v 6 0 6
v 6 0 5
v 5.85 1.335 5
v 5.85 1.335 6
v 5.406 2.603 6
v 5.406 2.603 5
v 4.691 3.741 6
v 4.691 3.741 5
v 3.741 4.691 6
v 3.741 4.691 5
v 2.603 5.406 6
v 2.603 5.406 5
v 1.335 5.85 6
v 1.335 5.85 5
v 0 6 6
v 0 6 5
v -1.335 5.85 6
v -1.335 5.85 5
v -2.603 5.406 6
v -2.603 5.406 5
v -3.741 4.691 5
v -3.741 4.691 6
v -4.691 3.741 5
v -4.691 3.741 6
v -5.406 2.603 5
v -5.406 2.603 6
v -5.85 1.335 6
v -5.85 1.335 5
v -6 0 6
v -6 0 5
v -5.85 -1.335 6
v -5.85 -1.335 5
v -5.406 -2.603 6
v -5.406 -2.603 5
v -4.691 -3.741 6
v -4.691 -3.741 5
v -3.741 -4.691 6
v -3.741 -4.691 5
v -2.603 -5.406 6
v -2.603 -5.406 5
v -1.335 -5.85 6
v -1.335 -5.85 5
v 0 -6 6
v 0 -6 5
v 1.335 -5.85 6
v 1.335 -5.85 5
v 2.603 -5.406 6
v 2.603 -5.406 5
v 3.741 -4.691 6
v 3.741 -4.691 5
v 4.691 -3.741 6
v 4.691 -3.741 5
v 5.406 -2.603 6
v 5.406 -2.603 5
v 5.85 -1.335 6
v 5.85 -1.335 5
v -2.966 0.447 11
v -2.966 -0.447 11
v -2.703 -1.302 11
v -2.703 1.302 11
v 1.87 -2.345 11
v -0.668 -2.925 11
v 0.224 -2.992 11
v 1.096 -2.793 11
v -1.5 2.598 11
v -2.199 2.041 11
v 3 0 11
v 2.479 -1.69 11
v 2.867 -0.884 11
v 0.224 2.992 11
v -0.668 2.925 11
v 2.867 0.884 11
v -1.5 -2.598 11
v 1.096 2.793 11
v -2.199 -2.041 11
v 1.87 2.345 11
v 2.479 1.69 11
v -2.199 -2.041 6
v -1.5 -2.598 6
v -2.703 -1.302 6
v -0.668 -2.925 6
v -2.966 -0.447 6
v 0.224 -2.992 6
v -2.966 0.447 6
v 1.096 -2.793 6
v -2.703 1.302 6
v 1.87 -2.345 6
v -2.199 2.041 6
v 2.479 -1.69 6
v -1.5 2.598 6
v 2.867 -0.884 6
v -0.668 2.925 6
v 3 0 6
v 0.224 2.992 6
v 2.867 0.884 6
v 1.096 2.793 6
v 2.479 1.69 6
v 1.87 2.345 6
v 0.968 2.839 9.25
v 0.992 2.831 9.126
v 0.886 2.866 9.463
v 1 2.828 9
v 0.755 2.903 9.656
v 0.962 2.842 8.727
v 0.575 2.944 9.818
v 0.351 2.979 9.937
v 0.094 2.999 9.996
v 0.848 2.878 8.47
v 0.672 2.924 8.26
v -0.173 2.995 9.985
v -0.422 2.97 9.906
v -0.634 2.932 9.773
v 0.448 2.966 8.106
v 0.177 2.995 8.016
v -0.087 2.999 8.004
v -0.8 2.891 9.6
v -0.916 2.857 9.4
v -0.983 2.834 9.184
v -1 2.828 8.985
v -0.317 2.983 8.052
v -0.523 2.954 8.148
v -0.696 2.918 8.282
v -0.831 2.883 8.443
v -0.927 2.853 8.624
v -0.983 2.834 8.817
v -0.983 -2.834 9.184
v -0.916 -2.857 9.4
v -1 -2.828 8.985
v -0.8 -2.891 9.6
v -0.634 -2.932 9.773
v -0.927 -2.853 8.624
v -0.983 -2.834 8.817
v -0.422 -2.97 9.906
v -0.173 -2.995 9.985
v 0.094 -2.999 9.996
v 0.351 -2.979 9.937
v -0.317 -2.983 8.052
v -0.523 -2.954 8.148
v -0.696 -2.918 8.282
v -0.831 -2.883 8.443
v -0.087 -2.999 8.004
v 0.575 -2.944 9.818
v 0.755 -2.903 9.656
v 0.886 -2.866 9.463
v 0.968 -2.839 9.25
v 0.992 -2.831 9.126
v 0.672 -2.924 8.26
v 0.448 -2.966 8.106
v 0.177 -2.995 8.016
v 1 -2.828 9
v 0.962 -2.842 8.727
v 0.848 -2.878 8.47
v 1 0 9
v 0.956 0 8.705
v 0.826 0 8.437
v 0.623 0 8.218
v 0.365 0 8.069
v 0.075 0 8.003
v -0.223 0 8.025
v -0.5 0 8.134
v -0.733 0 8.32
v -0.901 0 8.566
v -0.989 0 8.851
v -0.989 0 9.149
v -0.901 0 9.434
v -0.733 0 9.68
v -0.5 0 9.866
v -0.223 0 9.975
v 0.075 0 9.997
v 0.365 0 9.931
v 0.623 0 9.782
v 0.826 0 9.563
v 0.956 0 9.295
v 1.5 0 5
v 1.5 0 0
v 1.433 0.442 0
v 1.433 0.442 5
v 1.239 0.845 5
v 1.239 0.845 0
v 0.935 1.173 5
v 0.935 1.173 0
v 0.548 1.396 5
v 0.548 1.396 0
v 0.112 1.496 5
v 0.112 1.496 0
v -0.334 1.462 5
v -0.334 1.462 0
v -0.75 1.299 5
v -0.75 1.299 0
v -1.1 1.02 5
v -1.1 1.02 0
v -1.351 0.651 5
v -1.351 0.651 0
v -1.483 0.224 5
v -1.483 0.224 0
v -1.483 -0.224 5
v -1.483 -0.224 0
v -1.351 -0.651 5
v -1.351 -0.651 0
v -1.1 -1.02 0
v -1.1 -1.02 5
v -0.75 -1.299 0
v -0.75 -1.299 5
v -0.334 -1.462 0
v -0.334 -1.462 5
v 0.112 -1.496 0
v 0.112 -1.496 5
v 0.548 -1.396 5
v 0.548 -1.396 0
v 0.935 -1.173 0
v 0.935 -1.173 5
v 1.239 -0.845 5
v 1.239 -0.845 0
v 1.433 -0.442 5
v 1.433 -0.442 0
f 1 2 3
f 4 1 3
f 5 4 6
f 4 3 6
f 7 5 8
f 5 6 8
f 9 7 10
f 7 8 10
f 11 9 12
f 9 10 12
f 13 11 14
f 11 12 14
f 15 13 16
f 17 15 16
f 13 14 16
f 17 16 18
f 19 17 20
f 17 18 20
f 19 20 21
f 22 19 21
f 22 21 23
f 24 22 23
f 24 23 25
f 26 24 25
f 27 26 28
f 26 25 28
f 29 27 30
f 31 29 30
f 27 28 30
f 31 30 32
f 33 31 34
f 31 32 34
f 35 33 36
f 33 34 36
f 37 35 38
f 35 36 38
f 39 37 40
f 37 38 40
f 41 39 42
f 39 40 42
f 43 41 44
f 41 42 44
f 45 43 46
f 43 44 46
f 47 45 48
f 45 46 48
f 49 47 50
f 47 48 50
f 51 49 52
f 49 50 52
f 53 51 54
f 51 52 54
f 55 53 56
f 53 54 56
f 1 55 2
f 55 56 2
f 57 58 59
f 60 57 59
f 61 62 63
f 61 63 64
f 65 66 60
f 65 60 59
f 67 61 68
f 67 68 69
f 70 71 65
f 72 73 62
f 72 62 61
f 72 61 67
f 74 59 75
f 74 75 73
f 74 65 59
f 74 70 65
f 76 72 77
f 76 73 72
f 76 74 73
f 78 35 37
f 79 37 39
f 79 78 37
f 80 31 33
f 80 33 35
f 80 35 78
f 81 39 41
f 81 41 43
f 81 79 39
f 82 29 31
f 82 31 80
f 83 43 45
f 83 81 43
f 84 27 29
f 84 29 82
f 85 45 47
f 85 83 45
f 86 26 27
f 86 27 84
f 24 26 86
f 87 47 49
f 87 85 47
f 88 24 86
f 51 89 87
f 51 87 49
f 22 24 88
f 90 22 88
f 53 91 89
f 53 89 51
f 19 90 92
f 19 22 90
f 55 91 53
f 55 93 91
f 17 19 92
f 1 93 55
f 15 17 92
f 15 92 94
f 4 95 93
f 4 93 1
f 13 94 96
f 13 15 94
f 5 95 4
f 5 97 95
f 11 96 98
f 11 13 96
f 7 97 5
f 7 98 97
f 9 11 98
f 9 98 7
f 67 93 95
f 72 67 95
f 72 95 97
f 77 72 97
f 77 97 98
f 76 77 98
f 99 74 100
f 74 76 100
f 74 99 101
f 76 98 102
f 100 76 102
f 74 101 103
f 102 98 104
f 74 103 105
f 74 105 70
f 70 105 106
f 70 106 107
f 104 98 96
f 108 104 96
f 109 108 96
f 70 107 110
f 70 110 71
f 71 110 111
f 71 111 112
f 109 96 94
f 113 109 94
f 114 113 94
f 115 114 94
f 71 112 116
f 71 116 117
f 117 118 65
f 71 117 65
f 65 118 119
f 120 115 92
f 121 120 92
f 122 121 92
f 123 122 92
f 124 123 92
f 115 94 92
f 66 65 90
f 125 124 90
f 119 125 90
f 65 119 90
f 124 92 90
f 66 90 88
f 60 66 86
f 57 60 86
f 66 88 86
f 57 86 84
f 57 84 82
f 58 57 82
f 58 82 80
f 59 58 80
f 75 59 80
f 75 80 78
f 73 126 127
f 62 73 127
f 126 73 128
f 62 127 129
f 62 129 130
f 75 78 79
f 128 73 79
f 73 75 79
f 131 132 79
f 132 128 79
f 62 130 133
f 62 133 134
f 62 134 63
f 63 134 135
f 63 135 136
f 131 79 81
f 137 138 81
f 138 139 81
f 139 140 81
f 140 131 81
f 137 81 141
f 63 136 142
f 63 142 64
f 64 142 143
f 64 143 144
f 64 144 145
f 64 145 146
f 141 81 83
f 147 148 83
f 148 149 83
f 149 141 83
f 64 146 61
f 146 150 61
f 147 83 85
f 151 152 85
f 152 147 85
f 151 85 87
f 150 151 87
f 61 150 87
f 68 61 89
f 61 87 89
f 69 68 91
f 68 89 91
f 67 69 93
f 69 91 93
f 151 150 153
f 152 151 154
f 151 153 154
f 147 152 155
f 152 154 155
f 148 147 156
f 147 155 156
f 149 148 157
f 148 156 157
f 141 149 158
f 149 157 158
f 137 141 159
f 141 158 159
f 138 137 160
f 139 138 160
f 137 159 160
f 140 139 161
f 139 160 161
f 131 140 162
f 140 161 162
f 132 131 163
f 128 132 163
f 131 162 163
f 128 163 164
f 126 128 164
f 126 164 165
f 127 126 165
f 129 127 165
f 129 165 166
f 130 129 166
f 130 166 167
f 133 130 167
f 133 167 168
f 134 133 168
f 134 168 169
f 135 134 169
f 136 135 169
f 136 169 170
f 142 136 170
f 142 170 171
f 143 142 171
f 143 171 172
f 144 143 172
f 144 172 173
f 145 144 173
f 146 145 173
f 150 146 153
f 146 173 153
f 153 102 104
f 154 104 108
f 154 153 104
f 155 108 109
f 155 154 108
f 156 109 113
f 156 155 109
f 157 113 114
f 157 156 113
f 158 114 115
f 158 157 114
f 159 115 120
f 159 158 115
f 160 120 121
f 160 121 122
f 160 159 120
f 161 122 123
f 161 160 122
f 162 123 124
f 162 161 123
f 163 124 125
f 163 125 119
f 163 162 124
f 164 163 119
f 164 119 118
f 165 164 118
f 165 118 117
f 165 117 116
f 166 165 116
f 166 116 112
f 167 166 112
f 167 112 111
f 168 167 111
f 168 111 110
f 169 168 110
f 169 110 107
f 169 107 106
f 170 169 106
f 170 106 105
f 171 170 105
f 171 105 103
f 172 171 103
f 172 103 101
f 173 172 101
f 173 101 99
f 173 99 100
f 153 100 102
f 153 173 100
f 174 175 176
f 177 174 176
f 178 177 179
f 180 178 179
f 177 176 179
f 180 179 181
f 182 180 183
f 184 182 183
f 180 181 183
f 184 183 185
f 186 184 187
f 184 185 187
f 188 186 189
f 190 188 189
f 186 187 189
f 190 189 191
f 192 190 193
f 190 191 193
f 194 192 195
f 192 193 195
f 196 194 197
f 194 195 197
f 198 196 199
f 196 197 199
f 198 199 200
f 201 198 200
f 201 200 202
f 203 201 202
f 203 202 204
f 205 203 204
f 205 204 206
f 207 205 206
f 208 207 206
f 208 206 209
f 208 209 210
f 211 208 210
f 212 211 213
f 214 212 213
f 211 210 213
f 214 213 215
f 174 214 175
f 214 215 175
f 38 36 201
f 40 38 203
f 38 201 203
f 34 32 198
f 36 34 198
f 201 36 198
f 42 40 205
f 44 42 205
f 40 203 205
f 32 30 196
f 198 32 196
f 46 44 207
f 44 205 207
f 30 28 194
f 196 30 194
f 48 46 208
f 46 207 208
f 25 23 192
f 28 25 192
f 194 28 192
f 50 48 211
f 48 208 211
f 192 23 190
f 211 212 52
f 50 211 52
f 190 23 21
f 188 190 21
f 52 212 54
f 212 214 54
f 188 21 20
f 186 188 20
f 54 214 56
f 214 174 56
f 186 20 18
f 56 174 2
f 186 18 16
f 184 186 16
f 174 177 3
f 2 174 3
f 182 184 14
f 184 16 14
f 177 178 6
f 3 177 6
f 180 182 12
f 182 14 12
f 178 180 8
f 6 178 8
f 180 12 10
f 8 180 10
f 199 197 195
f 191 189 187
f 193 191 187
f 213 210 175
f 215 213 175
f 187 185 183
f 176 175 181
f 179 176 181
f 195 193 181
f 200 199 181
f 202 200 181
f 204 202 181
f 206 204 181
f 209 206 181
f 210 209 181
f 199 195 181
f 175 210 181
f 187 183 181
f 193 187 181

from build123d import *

# Parameters (mm, degrees)
ESQUISSE1_R                  = 1.5
BOSS_EXTRU_1_DEPTH           = 5
ESQUISSE2_R                  = 6
BOSS_EXTRU_2_DEPTH           = 1
ESQUISSE3_R                  = 3
BOSS_EXTRU_3_DEPTH           = 5
ENL_V_MAT_EXTRU_1_DEPTH      = 5
ENL_V_MAT_EXTRU_1_DEPTH_BACK = 5
ESQUISSE4_R                  = 1


with BuildPart() as part:
    # Esquisse1 → Boss.-Extru.1 (new body)
    with BuildSketch(Plane.XY):
        Circle(ESQUISSE1_R)
    extrude(amount=BOSS_EXTRU_1_DEPTH)

    # Esquisse2 → Boss.-Extru.2 (add)
    with BuildSketch(Plane.XY.offset(5)):
        Circle(ESQUISSE2_R)
    extrude(amount=BOSS_EXTRU_2_DEPTH)

    # Esquisse3 → Boss.-Extru.3 (add)
    with BuildSketch(Plane.XY.offset(6)):
        Circle(ESQUISSE3_R)
    extrude(amount=BOSS_EXTRU_3_DEPTH)

    # Esquisse4 → Enlèv. mat.-Extru.1 (cut, two sides: drawn at the far end of the back side and taken through both)
    with BuildSketch(Plane(origin=(0, 0, 0), x_dir=(1, 0, 0), z_dir=(0, 1, 0)).offset(-ENL_V_MAT_EXTRU_1_DEPTH_BACK)):
        with Locations((0, -9)):
            Circle(ESQUISSE4_R)
    extrude(amount=ENL_V_MAT_EXTRU_1_DEPTH + ENL_V_MAT_EXTRU_1_DEPTH_BACK, mode=Mode.SUBTRACT)


solid = part.part
